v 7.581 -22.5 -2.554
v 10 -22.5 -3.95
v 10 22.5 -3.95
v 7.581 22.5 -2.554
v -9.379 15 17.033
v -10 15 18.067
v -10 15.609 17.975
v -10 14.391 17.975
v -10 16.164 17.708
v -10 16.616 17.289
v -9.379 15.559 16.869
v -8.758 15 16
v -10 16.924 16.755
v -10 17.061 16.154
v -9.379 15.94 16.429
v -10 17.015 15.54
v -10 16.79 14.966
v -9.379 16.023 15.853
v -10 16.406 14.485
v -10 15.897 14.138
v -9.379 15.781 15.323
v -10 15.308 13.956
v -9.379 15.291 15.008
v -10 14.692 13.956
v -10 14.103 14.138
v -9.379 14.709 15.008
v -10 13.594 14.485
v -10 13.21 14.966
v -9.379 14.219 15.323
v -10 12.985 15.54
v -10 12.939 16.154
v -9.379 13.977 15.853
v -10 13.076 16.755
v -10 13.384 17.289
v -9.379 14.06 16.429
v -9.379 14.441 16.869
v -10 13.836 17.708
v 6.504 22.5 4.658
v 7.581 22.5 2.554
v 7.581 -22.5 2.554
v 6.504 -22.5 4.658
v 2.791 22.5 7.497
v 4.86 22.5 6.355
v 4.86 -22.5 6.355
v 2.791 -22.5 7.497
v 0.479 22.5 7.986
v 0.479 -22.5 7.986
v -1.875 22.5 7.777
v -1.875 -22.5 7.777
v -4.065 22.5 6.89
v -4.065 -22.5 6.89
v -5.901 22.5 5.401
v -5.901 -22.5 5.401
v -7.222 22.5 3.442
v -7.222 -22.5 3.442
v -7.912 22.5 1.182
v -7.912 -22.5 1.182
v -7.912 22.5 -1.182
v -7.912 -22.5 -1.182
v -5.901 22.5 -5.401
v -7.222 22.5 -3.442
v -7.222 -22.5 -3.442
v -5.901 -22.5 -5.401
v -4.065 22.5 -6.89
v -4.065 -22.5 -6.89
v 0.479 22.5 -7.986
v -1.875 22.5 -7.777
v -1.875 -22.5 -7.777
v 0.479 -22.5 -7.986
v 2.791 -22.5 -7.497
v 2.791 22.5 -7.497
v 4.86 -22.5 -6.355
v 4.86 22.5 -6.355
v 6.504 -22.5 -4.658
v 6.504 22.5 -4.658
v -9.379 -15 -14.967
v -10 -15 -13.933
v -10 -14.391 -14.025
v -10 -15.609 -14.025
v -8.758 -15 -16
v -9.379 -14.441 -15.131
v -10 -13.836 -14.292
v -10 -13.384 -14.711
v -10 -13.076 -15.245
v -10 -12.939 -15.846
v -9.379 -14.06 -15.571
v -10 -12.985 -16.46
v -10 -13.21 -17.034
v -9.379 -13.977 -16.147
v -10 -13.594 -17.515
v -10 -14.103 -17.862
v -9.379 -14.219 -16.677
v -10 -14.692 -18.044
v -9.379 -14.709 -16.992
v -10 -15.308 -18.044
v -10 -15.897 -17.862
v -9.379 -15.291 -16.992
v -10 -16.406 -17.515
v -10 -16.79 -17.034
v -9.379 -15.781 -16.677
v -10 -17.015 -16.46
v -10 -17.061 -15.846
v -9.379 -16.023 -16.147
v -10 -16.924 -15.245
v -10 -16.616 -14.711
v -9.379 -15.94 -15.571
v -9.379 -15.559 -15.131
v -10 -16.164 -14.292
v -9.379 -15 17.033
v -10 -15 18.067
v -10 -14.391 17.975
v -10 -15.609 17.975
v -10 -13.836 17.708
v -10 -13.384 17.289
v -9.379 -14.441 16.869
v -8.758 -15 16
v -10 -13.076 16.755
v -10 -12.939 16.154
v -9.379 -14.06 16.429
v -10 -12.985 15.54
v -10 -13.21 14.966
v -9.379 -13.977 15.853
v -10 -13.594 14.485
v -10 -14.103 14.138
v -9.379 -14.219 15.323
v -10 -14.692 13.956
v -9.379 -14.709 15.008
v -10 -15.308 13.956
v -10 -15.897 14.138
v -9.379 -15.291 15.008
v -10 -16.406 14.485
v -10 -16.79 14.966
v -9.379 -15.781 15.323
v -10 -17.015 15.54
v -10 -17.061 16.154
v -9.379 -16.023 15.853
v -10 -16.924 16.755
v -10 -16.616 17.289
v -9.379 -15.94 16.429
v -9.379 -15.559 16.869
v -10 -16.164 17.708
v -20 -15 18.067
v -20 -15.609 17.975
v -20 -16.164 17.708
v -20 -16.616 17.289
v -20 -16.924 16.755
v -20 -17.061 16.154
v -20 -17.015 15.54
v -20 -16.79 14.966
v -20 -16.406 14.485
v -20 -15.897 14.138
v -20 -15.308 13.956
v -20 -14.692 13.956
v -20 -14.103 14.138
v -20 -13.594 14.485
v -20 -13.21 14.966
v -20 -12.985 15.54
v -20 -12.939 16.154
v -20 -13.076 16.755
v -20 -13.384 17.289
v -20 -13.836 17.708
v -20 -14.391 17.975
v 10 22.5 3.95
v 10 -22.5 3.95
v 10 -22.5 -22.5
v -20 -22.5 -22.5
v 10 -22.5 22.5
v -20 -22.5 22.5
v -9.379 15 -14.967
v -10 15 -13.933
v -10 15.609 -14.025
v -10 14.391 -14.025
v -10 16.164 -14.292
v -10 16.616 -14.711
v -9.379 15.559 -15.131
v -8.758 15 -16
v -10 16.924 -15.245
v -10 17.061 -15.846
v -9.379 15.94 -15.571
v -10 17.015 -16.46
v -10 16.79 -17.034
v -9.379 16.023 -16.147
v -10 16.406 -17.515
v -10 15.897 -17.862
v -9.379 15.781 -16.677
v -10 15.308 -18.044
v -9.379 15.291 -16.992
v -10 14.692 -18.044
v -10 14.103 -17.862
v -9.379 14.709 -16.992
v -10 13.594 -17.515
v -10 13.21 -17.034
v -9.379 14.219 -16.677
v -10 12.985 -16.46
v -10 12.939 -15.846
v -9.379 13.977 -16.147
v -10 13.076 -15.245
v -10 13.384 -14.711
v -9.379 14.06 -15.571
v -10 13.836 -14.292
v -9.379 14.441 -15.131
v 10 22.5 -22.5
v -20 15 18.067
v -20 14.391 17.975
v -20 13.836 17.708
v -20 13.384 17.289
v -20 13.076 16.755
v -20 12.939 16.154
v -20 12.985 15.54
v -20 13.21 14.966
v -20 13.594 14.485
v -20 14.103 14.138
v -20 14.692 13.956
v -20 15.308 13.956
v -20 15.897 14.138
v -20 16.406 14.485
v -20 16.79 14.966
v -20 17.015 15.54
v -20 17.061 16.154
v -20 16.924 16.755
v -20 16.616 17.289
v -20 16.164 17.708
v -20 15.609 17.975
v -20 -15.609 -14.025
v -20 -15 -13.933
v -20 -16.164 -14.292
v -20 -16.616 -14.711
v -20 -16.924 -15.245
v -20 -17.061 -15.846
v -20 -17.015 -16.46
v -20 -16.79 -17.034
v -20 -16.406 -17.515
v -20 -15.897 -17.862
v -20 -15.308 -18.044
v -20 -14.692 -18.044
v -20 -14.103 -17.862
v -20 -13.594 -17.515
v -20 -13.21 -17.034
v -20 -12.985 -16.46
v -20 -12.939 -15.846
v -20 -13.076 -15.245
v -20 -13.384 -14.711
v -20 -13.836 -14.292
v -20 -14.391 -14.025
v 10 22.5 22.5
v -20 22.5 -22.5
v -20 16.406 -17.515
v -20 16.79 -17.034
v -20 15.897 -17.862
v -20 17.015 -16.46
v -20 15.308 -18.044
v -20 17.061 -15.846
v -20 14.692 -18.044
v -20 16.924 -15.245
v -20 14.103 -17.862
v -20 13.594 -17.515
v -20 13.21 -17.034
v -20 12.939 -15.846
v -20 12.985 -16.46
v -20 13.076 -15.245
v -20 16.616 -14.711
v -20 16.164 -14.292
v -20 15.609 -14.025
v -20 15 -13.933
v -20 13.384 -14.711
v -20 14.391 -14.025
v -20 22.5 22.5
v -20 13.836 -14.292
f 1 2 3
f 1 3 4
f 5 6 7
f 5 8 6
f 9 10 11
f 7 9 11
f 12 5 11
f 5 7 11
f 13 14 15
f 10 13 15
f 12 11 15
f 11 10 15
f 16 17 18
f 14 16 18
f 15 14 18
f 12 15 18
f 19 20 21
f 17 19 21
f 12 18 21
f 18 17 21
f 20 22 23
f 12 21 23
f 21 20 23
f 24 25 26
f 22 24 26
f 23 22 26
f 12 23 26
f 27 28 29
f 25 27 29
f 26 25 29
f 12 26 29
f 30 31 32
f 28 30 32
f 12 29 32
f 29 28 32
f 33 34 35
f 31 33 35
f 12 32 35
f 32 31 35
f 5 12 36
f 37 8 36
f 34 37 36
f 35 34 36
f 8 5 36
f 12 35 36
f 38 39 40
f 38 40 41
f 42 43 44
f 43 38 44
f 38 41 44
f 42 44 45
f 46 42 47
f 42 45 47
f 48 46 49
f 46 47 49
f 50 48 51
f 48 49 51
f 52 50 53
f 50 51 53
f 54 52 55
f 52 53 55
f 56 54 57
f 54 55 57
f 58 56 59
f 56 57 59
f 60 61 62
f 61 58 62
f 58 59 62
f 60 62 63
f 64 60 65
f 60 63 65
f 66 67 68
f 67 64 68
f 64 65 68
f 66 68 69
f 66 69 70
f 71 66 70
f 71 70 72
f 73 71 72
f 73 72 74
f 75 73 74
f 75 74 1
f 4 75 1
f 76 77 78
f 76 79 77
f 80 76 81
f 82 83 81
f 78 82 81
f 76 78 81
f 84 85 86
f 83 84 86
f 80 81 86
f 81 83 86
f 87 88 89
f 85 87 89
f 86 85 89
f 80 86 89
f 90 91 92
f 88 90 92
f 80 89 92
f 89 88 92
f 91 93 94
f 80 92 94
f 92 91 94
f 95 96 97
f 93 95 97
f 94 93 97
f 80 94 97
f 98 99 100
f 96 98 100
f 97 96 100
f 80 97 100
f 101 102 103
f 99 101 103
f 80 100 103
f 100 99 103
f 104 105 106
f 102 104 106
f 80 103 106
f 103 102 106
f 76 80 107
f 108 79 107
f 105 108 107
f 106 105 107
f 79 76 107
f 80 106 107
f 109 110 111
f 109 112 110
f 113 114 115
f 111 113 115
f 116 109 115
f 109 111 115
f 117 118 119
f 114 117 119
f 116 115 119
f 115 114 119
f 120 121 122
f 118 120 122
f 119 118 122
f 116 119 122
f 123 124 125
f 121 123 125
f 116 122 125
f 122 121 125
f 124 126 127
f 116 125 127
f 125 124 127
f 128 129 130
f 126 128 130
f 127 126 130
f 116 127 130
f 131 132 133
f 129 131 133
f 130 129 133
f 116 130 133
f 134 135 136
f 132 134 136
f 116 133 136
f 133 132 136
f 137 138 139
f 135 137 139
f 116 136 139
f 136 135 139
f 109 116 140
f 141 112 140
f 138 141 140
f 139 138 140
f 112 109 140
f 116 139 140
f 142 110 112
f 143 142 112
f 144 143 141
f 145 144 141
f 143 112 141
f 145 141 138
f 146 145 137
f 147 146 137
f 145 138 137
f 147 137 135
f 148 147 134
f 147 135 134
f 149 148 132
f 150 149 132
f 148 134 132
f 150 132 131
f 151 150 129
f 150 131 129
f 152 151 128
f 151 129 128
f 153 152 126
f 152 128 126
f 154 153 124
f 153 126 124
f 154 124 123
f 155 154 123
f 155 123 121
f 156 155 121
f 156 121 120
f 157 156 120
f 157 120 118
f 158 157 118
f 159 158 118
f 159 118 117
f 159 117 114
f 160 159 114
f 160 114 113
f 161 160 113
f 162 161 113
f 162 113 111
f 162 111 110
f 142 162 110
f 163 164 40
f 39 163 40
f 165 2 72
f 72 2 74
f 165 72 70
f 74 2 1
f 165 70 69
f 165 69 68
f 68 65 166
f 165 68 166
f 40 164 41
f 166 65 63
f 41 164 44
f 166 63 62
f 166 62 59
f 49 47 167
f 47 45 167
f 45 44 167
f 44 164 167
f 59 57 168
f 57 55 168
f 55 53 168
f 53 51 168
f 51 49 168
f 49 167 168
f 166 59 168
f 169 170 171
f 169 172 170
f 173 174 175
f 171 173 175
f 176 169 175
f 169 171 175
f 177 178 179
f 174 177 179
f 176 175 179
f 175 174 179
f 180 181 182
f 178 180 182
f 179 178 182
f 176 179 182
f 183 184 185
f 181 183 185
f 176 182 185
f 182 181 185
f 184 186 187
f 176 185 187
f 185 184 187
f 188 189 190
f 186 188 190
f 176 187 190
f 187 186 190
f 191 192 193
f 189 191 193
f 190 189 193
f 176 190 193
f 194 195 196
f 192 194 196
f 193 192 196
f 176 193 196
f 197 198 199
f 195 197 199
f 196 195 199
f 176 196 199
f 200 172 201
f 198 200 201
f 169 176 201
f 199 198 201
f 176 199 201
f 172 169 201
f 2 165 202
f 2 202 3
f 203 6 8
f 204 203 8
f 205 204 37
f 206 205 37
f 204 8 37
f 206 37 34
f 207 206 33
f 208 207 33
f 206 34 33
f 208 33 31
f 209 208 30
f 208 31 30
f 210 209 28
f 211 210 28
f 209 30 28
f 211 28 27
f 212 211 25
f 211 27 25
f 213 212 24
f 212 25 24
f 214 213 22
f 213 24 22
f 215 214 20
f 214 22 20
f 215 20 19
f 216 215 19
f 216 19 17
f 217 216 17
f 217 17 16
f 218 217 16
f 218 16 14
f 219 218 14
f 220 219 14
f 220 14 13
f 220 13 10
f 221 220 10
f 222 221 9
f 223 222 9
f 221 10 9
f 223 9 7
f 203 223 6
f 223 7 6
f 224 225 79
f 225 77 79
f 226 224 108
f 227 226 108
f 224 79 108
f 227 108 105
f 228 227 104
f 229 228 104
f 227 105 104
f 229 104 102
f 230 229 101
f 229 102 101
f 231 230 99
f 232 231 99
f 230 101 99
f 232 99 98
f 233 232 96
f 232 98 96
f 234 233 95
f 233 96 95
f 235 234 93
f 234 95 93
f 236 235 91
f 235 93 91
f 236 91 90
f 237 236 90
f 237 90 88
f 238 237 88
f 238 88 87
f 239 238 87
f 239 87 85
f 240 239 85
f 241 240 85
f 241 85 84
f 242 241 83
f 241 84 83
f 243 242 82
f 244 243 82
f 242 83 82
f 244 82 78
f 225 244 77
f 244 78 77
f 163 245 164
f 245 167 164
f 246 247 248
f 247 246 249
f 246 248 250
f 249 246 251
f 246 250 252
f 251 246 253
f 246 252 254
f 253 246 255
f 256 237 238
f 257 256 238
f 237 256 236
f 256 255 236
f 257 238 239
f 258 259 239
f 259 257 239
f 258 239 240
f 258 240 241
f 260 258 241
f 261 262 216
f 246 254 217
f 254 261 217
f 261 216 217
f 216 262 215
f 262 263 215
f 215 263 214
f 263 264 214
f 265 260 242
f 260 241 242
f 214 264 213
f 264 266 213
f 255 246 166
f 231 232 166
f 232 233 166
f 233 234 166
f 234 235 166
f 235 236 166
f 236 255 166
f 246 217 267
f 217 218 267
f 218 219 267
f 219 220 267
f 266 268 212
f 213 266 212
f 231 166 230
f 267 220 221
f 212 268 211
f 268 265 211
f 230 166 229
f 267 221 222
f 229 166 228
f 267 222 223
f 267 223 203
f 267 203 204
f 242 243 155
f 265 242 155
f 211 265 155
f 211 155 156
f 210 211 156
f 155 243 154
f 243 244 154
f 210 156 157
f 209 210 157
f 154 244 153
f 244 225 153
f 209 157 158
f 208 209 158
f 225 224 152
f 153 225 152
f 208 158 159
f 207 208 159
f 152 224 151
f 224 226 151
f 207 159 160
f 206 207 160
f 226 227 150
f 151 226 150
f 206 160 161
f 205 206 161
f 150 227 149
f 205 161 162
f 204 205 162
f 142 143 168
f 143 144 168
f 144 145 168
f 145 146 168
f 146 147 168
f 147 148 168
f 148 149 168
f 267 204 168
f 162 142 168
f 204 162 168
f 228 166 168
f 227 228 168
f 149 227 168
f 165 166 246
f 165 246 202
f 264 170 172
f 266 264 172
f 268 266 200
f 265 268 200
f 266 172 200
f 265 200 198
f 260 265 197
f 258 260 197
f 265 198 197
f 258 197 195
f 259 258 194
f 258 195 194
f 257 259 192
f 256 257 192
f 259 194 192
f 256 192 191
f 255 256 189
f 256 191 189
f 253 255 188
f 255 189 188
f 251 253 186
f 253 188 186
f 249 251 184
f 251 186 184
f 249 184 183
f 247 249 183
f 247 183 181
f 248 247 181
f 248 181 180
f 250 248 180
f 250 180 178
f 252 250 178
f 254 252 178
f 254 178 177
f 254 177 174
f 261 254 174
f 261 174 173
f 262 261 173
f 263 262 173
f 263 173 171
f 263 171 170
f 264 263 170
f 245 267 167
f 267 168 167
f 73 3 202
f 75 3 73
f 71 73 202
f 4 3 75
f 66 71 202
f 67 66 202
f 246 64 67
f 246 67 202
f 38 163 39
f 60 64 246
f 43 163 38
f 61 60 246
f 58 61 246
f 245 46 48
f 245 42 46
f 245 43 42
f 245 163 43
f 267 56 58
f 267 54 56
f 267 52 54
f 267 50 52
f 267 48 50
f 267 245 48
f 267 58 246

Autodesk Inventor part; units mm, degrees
ref_plane "YZ Plane" through (0, 0, 0) normal (1, 0, 0) x (0, 1, 0)
ref_plane "XZ Plane" through (0, 0, 0) normal (0, 1, 0) x (-1, 0, 0)
ref_plane "XY Plane" through (0, 0, 0) normal (0, 0, 1) x (1, 0, 0)
sketch "スケッチ1" plane through (0, 0, 0) normal (0, 1, 0) x (-1, 0, 0)
  arc A0 (-7.5813, -2.554) -> (-7.5813, 2.554) centre (0, 0) ccw
  line L0 (-10, -3.9505) -> (-7.5813, -2.554)
  line L1 (20, 0) -> (20, -22.5)
  line L2 (20, -22.5) -> (-10, -22.5)
  line L3 (-10, -22.5) -> (-10, -3.9505)
  line L4 (-10, 3.9505) -> (-7.5813, 2.554)
  line L5 (20, 0) -> (20, 22.5)
  line L6 (20, 22.5) -> (-10, 22.5)
  line L7 (-10, 22.5) -> (-10, 3.9505)
  dimension "d4" = 16
  dimension "d8" = 20
  dimension "d9" = 22.5
  dimension "d10" = 30
extrude "押し出し1" add sketch "スケッチ1" along normal mid plane 45
sketch "スケッチ2" plane through (-20, -22.5, -22.5) normal (-1, 0, 0) x (0, 0, 1)
  line L0 (45, 0) -> (45, 45) projected
  line L1 (0, 45) -> (45, 45) projected
  line L2 (45, 0) -> (0, 0) projected
  line L3 (22.5, 22.5) -> (22.5, 37.5)
  line L4 (22.5, 37.5) -> (38.5, 37.5)
  line L5 (22.5, 22.5) -> (0, 22.5)
  point P0 (6.5, 37.5)
  point P1 (38.5, 7.5)
  point P2 (6.5, 7.5)
  dimension "d13" = 15
  dimension "d14" = 16
hole "穴1" at (-20, 15, 16) at (-20, 15, -16) at (-20, -15, 16) at (-20, -15, -16) direction (1, 0, 0) diameter 4.134 depth 10 tip angle 118 thread size "M5x0.8" class "6H" standard "ISO Metric profile"
properties part number "linearbearing" material "ステンレス鋼 440C"
